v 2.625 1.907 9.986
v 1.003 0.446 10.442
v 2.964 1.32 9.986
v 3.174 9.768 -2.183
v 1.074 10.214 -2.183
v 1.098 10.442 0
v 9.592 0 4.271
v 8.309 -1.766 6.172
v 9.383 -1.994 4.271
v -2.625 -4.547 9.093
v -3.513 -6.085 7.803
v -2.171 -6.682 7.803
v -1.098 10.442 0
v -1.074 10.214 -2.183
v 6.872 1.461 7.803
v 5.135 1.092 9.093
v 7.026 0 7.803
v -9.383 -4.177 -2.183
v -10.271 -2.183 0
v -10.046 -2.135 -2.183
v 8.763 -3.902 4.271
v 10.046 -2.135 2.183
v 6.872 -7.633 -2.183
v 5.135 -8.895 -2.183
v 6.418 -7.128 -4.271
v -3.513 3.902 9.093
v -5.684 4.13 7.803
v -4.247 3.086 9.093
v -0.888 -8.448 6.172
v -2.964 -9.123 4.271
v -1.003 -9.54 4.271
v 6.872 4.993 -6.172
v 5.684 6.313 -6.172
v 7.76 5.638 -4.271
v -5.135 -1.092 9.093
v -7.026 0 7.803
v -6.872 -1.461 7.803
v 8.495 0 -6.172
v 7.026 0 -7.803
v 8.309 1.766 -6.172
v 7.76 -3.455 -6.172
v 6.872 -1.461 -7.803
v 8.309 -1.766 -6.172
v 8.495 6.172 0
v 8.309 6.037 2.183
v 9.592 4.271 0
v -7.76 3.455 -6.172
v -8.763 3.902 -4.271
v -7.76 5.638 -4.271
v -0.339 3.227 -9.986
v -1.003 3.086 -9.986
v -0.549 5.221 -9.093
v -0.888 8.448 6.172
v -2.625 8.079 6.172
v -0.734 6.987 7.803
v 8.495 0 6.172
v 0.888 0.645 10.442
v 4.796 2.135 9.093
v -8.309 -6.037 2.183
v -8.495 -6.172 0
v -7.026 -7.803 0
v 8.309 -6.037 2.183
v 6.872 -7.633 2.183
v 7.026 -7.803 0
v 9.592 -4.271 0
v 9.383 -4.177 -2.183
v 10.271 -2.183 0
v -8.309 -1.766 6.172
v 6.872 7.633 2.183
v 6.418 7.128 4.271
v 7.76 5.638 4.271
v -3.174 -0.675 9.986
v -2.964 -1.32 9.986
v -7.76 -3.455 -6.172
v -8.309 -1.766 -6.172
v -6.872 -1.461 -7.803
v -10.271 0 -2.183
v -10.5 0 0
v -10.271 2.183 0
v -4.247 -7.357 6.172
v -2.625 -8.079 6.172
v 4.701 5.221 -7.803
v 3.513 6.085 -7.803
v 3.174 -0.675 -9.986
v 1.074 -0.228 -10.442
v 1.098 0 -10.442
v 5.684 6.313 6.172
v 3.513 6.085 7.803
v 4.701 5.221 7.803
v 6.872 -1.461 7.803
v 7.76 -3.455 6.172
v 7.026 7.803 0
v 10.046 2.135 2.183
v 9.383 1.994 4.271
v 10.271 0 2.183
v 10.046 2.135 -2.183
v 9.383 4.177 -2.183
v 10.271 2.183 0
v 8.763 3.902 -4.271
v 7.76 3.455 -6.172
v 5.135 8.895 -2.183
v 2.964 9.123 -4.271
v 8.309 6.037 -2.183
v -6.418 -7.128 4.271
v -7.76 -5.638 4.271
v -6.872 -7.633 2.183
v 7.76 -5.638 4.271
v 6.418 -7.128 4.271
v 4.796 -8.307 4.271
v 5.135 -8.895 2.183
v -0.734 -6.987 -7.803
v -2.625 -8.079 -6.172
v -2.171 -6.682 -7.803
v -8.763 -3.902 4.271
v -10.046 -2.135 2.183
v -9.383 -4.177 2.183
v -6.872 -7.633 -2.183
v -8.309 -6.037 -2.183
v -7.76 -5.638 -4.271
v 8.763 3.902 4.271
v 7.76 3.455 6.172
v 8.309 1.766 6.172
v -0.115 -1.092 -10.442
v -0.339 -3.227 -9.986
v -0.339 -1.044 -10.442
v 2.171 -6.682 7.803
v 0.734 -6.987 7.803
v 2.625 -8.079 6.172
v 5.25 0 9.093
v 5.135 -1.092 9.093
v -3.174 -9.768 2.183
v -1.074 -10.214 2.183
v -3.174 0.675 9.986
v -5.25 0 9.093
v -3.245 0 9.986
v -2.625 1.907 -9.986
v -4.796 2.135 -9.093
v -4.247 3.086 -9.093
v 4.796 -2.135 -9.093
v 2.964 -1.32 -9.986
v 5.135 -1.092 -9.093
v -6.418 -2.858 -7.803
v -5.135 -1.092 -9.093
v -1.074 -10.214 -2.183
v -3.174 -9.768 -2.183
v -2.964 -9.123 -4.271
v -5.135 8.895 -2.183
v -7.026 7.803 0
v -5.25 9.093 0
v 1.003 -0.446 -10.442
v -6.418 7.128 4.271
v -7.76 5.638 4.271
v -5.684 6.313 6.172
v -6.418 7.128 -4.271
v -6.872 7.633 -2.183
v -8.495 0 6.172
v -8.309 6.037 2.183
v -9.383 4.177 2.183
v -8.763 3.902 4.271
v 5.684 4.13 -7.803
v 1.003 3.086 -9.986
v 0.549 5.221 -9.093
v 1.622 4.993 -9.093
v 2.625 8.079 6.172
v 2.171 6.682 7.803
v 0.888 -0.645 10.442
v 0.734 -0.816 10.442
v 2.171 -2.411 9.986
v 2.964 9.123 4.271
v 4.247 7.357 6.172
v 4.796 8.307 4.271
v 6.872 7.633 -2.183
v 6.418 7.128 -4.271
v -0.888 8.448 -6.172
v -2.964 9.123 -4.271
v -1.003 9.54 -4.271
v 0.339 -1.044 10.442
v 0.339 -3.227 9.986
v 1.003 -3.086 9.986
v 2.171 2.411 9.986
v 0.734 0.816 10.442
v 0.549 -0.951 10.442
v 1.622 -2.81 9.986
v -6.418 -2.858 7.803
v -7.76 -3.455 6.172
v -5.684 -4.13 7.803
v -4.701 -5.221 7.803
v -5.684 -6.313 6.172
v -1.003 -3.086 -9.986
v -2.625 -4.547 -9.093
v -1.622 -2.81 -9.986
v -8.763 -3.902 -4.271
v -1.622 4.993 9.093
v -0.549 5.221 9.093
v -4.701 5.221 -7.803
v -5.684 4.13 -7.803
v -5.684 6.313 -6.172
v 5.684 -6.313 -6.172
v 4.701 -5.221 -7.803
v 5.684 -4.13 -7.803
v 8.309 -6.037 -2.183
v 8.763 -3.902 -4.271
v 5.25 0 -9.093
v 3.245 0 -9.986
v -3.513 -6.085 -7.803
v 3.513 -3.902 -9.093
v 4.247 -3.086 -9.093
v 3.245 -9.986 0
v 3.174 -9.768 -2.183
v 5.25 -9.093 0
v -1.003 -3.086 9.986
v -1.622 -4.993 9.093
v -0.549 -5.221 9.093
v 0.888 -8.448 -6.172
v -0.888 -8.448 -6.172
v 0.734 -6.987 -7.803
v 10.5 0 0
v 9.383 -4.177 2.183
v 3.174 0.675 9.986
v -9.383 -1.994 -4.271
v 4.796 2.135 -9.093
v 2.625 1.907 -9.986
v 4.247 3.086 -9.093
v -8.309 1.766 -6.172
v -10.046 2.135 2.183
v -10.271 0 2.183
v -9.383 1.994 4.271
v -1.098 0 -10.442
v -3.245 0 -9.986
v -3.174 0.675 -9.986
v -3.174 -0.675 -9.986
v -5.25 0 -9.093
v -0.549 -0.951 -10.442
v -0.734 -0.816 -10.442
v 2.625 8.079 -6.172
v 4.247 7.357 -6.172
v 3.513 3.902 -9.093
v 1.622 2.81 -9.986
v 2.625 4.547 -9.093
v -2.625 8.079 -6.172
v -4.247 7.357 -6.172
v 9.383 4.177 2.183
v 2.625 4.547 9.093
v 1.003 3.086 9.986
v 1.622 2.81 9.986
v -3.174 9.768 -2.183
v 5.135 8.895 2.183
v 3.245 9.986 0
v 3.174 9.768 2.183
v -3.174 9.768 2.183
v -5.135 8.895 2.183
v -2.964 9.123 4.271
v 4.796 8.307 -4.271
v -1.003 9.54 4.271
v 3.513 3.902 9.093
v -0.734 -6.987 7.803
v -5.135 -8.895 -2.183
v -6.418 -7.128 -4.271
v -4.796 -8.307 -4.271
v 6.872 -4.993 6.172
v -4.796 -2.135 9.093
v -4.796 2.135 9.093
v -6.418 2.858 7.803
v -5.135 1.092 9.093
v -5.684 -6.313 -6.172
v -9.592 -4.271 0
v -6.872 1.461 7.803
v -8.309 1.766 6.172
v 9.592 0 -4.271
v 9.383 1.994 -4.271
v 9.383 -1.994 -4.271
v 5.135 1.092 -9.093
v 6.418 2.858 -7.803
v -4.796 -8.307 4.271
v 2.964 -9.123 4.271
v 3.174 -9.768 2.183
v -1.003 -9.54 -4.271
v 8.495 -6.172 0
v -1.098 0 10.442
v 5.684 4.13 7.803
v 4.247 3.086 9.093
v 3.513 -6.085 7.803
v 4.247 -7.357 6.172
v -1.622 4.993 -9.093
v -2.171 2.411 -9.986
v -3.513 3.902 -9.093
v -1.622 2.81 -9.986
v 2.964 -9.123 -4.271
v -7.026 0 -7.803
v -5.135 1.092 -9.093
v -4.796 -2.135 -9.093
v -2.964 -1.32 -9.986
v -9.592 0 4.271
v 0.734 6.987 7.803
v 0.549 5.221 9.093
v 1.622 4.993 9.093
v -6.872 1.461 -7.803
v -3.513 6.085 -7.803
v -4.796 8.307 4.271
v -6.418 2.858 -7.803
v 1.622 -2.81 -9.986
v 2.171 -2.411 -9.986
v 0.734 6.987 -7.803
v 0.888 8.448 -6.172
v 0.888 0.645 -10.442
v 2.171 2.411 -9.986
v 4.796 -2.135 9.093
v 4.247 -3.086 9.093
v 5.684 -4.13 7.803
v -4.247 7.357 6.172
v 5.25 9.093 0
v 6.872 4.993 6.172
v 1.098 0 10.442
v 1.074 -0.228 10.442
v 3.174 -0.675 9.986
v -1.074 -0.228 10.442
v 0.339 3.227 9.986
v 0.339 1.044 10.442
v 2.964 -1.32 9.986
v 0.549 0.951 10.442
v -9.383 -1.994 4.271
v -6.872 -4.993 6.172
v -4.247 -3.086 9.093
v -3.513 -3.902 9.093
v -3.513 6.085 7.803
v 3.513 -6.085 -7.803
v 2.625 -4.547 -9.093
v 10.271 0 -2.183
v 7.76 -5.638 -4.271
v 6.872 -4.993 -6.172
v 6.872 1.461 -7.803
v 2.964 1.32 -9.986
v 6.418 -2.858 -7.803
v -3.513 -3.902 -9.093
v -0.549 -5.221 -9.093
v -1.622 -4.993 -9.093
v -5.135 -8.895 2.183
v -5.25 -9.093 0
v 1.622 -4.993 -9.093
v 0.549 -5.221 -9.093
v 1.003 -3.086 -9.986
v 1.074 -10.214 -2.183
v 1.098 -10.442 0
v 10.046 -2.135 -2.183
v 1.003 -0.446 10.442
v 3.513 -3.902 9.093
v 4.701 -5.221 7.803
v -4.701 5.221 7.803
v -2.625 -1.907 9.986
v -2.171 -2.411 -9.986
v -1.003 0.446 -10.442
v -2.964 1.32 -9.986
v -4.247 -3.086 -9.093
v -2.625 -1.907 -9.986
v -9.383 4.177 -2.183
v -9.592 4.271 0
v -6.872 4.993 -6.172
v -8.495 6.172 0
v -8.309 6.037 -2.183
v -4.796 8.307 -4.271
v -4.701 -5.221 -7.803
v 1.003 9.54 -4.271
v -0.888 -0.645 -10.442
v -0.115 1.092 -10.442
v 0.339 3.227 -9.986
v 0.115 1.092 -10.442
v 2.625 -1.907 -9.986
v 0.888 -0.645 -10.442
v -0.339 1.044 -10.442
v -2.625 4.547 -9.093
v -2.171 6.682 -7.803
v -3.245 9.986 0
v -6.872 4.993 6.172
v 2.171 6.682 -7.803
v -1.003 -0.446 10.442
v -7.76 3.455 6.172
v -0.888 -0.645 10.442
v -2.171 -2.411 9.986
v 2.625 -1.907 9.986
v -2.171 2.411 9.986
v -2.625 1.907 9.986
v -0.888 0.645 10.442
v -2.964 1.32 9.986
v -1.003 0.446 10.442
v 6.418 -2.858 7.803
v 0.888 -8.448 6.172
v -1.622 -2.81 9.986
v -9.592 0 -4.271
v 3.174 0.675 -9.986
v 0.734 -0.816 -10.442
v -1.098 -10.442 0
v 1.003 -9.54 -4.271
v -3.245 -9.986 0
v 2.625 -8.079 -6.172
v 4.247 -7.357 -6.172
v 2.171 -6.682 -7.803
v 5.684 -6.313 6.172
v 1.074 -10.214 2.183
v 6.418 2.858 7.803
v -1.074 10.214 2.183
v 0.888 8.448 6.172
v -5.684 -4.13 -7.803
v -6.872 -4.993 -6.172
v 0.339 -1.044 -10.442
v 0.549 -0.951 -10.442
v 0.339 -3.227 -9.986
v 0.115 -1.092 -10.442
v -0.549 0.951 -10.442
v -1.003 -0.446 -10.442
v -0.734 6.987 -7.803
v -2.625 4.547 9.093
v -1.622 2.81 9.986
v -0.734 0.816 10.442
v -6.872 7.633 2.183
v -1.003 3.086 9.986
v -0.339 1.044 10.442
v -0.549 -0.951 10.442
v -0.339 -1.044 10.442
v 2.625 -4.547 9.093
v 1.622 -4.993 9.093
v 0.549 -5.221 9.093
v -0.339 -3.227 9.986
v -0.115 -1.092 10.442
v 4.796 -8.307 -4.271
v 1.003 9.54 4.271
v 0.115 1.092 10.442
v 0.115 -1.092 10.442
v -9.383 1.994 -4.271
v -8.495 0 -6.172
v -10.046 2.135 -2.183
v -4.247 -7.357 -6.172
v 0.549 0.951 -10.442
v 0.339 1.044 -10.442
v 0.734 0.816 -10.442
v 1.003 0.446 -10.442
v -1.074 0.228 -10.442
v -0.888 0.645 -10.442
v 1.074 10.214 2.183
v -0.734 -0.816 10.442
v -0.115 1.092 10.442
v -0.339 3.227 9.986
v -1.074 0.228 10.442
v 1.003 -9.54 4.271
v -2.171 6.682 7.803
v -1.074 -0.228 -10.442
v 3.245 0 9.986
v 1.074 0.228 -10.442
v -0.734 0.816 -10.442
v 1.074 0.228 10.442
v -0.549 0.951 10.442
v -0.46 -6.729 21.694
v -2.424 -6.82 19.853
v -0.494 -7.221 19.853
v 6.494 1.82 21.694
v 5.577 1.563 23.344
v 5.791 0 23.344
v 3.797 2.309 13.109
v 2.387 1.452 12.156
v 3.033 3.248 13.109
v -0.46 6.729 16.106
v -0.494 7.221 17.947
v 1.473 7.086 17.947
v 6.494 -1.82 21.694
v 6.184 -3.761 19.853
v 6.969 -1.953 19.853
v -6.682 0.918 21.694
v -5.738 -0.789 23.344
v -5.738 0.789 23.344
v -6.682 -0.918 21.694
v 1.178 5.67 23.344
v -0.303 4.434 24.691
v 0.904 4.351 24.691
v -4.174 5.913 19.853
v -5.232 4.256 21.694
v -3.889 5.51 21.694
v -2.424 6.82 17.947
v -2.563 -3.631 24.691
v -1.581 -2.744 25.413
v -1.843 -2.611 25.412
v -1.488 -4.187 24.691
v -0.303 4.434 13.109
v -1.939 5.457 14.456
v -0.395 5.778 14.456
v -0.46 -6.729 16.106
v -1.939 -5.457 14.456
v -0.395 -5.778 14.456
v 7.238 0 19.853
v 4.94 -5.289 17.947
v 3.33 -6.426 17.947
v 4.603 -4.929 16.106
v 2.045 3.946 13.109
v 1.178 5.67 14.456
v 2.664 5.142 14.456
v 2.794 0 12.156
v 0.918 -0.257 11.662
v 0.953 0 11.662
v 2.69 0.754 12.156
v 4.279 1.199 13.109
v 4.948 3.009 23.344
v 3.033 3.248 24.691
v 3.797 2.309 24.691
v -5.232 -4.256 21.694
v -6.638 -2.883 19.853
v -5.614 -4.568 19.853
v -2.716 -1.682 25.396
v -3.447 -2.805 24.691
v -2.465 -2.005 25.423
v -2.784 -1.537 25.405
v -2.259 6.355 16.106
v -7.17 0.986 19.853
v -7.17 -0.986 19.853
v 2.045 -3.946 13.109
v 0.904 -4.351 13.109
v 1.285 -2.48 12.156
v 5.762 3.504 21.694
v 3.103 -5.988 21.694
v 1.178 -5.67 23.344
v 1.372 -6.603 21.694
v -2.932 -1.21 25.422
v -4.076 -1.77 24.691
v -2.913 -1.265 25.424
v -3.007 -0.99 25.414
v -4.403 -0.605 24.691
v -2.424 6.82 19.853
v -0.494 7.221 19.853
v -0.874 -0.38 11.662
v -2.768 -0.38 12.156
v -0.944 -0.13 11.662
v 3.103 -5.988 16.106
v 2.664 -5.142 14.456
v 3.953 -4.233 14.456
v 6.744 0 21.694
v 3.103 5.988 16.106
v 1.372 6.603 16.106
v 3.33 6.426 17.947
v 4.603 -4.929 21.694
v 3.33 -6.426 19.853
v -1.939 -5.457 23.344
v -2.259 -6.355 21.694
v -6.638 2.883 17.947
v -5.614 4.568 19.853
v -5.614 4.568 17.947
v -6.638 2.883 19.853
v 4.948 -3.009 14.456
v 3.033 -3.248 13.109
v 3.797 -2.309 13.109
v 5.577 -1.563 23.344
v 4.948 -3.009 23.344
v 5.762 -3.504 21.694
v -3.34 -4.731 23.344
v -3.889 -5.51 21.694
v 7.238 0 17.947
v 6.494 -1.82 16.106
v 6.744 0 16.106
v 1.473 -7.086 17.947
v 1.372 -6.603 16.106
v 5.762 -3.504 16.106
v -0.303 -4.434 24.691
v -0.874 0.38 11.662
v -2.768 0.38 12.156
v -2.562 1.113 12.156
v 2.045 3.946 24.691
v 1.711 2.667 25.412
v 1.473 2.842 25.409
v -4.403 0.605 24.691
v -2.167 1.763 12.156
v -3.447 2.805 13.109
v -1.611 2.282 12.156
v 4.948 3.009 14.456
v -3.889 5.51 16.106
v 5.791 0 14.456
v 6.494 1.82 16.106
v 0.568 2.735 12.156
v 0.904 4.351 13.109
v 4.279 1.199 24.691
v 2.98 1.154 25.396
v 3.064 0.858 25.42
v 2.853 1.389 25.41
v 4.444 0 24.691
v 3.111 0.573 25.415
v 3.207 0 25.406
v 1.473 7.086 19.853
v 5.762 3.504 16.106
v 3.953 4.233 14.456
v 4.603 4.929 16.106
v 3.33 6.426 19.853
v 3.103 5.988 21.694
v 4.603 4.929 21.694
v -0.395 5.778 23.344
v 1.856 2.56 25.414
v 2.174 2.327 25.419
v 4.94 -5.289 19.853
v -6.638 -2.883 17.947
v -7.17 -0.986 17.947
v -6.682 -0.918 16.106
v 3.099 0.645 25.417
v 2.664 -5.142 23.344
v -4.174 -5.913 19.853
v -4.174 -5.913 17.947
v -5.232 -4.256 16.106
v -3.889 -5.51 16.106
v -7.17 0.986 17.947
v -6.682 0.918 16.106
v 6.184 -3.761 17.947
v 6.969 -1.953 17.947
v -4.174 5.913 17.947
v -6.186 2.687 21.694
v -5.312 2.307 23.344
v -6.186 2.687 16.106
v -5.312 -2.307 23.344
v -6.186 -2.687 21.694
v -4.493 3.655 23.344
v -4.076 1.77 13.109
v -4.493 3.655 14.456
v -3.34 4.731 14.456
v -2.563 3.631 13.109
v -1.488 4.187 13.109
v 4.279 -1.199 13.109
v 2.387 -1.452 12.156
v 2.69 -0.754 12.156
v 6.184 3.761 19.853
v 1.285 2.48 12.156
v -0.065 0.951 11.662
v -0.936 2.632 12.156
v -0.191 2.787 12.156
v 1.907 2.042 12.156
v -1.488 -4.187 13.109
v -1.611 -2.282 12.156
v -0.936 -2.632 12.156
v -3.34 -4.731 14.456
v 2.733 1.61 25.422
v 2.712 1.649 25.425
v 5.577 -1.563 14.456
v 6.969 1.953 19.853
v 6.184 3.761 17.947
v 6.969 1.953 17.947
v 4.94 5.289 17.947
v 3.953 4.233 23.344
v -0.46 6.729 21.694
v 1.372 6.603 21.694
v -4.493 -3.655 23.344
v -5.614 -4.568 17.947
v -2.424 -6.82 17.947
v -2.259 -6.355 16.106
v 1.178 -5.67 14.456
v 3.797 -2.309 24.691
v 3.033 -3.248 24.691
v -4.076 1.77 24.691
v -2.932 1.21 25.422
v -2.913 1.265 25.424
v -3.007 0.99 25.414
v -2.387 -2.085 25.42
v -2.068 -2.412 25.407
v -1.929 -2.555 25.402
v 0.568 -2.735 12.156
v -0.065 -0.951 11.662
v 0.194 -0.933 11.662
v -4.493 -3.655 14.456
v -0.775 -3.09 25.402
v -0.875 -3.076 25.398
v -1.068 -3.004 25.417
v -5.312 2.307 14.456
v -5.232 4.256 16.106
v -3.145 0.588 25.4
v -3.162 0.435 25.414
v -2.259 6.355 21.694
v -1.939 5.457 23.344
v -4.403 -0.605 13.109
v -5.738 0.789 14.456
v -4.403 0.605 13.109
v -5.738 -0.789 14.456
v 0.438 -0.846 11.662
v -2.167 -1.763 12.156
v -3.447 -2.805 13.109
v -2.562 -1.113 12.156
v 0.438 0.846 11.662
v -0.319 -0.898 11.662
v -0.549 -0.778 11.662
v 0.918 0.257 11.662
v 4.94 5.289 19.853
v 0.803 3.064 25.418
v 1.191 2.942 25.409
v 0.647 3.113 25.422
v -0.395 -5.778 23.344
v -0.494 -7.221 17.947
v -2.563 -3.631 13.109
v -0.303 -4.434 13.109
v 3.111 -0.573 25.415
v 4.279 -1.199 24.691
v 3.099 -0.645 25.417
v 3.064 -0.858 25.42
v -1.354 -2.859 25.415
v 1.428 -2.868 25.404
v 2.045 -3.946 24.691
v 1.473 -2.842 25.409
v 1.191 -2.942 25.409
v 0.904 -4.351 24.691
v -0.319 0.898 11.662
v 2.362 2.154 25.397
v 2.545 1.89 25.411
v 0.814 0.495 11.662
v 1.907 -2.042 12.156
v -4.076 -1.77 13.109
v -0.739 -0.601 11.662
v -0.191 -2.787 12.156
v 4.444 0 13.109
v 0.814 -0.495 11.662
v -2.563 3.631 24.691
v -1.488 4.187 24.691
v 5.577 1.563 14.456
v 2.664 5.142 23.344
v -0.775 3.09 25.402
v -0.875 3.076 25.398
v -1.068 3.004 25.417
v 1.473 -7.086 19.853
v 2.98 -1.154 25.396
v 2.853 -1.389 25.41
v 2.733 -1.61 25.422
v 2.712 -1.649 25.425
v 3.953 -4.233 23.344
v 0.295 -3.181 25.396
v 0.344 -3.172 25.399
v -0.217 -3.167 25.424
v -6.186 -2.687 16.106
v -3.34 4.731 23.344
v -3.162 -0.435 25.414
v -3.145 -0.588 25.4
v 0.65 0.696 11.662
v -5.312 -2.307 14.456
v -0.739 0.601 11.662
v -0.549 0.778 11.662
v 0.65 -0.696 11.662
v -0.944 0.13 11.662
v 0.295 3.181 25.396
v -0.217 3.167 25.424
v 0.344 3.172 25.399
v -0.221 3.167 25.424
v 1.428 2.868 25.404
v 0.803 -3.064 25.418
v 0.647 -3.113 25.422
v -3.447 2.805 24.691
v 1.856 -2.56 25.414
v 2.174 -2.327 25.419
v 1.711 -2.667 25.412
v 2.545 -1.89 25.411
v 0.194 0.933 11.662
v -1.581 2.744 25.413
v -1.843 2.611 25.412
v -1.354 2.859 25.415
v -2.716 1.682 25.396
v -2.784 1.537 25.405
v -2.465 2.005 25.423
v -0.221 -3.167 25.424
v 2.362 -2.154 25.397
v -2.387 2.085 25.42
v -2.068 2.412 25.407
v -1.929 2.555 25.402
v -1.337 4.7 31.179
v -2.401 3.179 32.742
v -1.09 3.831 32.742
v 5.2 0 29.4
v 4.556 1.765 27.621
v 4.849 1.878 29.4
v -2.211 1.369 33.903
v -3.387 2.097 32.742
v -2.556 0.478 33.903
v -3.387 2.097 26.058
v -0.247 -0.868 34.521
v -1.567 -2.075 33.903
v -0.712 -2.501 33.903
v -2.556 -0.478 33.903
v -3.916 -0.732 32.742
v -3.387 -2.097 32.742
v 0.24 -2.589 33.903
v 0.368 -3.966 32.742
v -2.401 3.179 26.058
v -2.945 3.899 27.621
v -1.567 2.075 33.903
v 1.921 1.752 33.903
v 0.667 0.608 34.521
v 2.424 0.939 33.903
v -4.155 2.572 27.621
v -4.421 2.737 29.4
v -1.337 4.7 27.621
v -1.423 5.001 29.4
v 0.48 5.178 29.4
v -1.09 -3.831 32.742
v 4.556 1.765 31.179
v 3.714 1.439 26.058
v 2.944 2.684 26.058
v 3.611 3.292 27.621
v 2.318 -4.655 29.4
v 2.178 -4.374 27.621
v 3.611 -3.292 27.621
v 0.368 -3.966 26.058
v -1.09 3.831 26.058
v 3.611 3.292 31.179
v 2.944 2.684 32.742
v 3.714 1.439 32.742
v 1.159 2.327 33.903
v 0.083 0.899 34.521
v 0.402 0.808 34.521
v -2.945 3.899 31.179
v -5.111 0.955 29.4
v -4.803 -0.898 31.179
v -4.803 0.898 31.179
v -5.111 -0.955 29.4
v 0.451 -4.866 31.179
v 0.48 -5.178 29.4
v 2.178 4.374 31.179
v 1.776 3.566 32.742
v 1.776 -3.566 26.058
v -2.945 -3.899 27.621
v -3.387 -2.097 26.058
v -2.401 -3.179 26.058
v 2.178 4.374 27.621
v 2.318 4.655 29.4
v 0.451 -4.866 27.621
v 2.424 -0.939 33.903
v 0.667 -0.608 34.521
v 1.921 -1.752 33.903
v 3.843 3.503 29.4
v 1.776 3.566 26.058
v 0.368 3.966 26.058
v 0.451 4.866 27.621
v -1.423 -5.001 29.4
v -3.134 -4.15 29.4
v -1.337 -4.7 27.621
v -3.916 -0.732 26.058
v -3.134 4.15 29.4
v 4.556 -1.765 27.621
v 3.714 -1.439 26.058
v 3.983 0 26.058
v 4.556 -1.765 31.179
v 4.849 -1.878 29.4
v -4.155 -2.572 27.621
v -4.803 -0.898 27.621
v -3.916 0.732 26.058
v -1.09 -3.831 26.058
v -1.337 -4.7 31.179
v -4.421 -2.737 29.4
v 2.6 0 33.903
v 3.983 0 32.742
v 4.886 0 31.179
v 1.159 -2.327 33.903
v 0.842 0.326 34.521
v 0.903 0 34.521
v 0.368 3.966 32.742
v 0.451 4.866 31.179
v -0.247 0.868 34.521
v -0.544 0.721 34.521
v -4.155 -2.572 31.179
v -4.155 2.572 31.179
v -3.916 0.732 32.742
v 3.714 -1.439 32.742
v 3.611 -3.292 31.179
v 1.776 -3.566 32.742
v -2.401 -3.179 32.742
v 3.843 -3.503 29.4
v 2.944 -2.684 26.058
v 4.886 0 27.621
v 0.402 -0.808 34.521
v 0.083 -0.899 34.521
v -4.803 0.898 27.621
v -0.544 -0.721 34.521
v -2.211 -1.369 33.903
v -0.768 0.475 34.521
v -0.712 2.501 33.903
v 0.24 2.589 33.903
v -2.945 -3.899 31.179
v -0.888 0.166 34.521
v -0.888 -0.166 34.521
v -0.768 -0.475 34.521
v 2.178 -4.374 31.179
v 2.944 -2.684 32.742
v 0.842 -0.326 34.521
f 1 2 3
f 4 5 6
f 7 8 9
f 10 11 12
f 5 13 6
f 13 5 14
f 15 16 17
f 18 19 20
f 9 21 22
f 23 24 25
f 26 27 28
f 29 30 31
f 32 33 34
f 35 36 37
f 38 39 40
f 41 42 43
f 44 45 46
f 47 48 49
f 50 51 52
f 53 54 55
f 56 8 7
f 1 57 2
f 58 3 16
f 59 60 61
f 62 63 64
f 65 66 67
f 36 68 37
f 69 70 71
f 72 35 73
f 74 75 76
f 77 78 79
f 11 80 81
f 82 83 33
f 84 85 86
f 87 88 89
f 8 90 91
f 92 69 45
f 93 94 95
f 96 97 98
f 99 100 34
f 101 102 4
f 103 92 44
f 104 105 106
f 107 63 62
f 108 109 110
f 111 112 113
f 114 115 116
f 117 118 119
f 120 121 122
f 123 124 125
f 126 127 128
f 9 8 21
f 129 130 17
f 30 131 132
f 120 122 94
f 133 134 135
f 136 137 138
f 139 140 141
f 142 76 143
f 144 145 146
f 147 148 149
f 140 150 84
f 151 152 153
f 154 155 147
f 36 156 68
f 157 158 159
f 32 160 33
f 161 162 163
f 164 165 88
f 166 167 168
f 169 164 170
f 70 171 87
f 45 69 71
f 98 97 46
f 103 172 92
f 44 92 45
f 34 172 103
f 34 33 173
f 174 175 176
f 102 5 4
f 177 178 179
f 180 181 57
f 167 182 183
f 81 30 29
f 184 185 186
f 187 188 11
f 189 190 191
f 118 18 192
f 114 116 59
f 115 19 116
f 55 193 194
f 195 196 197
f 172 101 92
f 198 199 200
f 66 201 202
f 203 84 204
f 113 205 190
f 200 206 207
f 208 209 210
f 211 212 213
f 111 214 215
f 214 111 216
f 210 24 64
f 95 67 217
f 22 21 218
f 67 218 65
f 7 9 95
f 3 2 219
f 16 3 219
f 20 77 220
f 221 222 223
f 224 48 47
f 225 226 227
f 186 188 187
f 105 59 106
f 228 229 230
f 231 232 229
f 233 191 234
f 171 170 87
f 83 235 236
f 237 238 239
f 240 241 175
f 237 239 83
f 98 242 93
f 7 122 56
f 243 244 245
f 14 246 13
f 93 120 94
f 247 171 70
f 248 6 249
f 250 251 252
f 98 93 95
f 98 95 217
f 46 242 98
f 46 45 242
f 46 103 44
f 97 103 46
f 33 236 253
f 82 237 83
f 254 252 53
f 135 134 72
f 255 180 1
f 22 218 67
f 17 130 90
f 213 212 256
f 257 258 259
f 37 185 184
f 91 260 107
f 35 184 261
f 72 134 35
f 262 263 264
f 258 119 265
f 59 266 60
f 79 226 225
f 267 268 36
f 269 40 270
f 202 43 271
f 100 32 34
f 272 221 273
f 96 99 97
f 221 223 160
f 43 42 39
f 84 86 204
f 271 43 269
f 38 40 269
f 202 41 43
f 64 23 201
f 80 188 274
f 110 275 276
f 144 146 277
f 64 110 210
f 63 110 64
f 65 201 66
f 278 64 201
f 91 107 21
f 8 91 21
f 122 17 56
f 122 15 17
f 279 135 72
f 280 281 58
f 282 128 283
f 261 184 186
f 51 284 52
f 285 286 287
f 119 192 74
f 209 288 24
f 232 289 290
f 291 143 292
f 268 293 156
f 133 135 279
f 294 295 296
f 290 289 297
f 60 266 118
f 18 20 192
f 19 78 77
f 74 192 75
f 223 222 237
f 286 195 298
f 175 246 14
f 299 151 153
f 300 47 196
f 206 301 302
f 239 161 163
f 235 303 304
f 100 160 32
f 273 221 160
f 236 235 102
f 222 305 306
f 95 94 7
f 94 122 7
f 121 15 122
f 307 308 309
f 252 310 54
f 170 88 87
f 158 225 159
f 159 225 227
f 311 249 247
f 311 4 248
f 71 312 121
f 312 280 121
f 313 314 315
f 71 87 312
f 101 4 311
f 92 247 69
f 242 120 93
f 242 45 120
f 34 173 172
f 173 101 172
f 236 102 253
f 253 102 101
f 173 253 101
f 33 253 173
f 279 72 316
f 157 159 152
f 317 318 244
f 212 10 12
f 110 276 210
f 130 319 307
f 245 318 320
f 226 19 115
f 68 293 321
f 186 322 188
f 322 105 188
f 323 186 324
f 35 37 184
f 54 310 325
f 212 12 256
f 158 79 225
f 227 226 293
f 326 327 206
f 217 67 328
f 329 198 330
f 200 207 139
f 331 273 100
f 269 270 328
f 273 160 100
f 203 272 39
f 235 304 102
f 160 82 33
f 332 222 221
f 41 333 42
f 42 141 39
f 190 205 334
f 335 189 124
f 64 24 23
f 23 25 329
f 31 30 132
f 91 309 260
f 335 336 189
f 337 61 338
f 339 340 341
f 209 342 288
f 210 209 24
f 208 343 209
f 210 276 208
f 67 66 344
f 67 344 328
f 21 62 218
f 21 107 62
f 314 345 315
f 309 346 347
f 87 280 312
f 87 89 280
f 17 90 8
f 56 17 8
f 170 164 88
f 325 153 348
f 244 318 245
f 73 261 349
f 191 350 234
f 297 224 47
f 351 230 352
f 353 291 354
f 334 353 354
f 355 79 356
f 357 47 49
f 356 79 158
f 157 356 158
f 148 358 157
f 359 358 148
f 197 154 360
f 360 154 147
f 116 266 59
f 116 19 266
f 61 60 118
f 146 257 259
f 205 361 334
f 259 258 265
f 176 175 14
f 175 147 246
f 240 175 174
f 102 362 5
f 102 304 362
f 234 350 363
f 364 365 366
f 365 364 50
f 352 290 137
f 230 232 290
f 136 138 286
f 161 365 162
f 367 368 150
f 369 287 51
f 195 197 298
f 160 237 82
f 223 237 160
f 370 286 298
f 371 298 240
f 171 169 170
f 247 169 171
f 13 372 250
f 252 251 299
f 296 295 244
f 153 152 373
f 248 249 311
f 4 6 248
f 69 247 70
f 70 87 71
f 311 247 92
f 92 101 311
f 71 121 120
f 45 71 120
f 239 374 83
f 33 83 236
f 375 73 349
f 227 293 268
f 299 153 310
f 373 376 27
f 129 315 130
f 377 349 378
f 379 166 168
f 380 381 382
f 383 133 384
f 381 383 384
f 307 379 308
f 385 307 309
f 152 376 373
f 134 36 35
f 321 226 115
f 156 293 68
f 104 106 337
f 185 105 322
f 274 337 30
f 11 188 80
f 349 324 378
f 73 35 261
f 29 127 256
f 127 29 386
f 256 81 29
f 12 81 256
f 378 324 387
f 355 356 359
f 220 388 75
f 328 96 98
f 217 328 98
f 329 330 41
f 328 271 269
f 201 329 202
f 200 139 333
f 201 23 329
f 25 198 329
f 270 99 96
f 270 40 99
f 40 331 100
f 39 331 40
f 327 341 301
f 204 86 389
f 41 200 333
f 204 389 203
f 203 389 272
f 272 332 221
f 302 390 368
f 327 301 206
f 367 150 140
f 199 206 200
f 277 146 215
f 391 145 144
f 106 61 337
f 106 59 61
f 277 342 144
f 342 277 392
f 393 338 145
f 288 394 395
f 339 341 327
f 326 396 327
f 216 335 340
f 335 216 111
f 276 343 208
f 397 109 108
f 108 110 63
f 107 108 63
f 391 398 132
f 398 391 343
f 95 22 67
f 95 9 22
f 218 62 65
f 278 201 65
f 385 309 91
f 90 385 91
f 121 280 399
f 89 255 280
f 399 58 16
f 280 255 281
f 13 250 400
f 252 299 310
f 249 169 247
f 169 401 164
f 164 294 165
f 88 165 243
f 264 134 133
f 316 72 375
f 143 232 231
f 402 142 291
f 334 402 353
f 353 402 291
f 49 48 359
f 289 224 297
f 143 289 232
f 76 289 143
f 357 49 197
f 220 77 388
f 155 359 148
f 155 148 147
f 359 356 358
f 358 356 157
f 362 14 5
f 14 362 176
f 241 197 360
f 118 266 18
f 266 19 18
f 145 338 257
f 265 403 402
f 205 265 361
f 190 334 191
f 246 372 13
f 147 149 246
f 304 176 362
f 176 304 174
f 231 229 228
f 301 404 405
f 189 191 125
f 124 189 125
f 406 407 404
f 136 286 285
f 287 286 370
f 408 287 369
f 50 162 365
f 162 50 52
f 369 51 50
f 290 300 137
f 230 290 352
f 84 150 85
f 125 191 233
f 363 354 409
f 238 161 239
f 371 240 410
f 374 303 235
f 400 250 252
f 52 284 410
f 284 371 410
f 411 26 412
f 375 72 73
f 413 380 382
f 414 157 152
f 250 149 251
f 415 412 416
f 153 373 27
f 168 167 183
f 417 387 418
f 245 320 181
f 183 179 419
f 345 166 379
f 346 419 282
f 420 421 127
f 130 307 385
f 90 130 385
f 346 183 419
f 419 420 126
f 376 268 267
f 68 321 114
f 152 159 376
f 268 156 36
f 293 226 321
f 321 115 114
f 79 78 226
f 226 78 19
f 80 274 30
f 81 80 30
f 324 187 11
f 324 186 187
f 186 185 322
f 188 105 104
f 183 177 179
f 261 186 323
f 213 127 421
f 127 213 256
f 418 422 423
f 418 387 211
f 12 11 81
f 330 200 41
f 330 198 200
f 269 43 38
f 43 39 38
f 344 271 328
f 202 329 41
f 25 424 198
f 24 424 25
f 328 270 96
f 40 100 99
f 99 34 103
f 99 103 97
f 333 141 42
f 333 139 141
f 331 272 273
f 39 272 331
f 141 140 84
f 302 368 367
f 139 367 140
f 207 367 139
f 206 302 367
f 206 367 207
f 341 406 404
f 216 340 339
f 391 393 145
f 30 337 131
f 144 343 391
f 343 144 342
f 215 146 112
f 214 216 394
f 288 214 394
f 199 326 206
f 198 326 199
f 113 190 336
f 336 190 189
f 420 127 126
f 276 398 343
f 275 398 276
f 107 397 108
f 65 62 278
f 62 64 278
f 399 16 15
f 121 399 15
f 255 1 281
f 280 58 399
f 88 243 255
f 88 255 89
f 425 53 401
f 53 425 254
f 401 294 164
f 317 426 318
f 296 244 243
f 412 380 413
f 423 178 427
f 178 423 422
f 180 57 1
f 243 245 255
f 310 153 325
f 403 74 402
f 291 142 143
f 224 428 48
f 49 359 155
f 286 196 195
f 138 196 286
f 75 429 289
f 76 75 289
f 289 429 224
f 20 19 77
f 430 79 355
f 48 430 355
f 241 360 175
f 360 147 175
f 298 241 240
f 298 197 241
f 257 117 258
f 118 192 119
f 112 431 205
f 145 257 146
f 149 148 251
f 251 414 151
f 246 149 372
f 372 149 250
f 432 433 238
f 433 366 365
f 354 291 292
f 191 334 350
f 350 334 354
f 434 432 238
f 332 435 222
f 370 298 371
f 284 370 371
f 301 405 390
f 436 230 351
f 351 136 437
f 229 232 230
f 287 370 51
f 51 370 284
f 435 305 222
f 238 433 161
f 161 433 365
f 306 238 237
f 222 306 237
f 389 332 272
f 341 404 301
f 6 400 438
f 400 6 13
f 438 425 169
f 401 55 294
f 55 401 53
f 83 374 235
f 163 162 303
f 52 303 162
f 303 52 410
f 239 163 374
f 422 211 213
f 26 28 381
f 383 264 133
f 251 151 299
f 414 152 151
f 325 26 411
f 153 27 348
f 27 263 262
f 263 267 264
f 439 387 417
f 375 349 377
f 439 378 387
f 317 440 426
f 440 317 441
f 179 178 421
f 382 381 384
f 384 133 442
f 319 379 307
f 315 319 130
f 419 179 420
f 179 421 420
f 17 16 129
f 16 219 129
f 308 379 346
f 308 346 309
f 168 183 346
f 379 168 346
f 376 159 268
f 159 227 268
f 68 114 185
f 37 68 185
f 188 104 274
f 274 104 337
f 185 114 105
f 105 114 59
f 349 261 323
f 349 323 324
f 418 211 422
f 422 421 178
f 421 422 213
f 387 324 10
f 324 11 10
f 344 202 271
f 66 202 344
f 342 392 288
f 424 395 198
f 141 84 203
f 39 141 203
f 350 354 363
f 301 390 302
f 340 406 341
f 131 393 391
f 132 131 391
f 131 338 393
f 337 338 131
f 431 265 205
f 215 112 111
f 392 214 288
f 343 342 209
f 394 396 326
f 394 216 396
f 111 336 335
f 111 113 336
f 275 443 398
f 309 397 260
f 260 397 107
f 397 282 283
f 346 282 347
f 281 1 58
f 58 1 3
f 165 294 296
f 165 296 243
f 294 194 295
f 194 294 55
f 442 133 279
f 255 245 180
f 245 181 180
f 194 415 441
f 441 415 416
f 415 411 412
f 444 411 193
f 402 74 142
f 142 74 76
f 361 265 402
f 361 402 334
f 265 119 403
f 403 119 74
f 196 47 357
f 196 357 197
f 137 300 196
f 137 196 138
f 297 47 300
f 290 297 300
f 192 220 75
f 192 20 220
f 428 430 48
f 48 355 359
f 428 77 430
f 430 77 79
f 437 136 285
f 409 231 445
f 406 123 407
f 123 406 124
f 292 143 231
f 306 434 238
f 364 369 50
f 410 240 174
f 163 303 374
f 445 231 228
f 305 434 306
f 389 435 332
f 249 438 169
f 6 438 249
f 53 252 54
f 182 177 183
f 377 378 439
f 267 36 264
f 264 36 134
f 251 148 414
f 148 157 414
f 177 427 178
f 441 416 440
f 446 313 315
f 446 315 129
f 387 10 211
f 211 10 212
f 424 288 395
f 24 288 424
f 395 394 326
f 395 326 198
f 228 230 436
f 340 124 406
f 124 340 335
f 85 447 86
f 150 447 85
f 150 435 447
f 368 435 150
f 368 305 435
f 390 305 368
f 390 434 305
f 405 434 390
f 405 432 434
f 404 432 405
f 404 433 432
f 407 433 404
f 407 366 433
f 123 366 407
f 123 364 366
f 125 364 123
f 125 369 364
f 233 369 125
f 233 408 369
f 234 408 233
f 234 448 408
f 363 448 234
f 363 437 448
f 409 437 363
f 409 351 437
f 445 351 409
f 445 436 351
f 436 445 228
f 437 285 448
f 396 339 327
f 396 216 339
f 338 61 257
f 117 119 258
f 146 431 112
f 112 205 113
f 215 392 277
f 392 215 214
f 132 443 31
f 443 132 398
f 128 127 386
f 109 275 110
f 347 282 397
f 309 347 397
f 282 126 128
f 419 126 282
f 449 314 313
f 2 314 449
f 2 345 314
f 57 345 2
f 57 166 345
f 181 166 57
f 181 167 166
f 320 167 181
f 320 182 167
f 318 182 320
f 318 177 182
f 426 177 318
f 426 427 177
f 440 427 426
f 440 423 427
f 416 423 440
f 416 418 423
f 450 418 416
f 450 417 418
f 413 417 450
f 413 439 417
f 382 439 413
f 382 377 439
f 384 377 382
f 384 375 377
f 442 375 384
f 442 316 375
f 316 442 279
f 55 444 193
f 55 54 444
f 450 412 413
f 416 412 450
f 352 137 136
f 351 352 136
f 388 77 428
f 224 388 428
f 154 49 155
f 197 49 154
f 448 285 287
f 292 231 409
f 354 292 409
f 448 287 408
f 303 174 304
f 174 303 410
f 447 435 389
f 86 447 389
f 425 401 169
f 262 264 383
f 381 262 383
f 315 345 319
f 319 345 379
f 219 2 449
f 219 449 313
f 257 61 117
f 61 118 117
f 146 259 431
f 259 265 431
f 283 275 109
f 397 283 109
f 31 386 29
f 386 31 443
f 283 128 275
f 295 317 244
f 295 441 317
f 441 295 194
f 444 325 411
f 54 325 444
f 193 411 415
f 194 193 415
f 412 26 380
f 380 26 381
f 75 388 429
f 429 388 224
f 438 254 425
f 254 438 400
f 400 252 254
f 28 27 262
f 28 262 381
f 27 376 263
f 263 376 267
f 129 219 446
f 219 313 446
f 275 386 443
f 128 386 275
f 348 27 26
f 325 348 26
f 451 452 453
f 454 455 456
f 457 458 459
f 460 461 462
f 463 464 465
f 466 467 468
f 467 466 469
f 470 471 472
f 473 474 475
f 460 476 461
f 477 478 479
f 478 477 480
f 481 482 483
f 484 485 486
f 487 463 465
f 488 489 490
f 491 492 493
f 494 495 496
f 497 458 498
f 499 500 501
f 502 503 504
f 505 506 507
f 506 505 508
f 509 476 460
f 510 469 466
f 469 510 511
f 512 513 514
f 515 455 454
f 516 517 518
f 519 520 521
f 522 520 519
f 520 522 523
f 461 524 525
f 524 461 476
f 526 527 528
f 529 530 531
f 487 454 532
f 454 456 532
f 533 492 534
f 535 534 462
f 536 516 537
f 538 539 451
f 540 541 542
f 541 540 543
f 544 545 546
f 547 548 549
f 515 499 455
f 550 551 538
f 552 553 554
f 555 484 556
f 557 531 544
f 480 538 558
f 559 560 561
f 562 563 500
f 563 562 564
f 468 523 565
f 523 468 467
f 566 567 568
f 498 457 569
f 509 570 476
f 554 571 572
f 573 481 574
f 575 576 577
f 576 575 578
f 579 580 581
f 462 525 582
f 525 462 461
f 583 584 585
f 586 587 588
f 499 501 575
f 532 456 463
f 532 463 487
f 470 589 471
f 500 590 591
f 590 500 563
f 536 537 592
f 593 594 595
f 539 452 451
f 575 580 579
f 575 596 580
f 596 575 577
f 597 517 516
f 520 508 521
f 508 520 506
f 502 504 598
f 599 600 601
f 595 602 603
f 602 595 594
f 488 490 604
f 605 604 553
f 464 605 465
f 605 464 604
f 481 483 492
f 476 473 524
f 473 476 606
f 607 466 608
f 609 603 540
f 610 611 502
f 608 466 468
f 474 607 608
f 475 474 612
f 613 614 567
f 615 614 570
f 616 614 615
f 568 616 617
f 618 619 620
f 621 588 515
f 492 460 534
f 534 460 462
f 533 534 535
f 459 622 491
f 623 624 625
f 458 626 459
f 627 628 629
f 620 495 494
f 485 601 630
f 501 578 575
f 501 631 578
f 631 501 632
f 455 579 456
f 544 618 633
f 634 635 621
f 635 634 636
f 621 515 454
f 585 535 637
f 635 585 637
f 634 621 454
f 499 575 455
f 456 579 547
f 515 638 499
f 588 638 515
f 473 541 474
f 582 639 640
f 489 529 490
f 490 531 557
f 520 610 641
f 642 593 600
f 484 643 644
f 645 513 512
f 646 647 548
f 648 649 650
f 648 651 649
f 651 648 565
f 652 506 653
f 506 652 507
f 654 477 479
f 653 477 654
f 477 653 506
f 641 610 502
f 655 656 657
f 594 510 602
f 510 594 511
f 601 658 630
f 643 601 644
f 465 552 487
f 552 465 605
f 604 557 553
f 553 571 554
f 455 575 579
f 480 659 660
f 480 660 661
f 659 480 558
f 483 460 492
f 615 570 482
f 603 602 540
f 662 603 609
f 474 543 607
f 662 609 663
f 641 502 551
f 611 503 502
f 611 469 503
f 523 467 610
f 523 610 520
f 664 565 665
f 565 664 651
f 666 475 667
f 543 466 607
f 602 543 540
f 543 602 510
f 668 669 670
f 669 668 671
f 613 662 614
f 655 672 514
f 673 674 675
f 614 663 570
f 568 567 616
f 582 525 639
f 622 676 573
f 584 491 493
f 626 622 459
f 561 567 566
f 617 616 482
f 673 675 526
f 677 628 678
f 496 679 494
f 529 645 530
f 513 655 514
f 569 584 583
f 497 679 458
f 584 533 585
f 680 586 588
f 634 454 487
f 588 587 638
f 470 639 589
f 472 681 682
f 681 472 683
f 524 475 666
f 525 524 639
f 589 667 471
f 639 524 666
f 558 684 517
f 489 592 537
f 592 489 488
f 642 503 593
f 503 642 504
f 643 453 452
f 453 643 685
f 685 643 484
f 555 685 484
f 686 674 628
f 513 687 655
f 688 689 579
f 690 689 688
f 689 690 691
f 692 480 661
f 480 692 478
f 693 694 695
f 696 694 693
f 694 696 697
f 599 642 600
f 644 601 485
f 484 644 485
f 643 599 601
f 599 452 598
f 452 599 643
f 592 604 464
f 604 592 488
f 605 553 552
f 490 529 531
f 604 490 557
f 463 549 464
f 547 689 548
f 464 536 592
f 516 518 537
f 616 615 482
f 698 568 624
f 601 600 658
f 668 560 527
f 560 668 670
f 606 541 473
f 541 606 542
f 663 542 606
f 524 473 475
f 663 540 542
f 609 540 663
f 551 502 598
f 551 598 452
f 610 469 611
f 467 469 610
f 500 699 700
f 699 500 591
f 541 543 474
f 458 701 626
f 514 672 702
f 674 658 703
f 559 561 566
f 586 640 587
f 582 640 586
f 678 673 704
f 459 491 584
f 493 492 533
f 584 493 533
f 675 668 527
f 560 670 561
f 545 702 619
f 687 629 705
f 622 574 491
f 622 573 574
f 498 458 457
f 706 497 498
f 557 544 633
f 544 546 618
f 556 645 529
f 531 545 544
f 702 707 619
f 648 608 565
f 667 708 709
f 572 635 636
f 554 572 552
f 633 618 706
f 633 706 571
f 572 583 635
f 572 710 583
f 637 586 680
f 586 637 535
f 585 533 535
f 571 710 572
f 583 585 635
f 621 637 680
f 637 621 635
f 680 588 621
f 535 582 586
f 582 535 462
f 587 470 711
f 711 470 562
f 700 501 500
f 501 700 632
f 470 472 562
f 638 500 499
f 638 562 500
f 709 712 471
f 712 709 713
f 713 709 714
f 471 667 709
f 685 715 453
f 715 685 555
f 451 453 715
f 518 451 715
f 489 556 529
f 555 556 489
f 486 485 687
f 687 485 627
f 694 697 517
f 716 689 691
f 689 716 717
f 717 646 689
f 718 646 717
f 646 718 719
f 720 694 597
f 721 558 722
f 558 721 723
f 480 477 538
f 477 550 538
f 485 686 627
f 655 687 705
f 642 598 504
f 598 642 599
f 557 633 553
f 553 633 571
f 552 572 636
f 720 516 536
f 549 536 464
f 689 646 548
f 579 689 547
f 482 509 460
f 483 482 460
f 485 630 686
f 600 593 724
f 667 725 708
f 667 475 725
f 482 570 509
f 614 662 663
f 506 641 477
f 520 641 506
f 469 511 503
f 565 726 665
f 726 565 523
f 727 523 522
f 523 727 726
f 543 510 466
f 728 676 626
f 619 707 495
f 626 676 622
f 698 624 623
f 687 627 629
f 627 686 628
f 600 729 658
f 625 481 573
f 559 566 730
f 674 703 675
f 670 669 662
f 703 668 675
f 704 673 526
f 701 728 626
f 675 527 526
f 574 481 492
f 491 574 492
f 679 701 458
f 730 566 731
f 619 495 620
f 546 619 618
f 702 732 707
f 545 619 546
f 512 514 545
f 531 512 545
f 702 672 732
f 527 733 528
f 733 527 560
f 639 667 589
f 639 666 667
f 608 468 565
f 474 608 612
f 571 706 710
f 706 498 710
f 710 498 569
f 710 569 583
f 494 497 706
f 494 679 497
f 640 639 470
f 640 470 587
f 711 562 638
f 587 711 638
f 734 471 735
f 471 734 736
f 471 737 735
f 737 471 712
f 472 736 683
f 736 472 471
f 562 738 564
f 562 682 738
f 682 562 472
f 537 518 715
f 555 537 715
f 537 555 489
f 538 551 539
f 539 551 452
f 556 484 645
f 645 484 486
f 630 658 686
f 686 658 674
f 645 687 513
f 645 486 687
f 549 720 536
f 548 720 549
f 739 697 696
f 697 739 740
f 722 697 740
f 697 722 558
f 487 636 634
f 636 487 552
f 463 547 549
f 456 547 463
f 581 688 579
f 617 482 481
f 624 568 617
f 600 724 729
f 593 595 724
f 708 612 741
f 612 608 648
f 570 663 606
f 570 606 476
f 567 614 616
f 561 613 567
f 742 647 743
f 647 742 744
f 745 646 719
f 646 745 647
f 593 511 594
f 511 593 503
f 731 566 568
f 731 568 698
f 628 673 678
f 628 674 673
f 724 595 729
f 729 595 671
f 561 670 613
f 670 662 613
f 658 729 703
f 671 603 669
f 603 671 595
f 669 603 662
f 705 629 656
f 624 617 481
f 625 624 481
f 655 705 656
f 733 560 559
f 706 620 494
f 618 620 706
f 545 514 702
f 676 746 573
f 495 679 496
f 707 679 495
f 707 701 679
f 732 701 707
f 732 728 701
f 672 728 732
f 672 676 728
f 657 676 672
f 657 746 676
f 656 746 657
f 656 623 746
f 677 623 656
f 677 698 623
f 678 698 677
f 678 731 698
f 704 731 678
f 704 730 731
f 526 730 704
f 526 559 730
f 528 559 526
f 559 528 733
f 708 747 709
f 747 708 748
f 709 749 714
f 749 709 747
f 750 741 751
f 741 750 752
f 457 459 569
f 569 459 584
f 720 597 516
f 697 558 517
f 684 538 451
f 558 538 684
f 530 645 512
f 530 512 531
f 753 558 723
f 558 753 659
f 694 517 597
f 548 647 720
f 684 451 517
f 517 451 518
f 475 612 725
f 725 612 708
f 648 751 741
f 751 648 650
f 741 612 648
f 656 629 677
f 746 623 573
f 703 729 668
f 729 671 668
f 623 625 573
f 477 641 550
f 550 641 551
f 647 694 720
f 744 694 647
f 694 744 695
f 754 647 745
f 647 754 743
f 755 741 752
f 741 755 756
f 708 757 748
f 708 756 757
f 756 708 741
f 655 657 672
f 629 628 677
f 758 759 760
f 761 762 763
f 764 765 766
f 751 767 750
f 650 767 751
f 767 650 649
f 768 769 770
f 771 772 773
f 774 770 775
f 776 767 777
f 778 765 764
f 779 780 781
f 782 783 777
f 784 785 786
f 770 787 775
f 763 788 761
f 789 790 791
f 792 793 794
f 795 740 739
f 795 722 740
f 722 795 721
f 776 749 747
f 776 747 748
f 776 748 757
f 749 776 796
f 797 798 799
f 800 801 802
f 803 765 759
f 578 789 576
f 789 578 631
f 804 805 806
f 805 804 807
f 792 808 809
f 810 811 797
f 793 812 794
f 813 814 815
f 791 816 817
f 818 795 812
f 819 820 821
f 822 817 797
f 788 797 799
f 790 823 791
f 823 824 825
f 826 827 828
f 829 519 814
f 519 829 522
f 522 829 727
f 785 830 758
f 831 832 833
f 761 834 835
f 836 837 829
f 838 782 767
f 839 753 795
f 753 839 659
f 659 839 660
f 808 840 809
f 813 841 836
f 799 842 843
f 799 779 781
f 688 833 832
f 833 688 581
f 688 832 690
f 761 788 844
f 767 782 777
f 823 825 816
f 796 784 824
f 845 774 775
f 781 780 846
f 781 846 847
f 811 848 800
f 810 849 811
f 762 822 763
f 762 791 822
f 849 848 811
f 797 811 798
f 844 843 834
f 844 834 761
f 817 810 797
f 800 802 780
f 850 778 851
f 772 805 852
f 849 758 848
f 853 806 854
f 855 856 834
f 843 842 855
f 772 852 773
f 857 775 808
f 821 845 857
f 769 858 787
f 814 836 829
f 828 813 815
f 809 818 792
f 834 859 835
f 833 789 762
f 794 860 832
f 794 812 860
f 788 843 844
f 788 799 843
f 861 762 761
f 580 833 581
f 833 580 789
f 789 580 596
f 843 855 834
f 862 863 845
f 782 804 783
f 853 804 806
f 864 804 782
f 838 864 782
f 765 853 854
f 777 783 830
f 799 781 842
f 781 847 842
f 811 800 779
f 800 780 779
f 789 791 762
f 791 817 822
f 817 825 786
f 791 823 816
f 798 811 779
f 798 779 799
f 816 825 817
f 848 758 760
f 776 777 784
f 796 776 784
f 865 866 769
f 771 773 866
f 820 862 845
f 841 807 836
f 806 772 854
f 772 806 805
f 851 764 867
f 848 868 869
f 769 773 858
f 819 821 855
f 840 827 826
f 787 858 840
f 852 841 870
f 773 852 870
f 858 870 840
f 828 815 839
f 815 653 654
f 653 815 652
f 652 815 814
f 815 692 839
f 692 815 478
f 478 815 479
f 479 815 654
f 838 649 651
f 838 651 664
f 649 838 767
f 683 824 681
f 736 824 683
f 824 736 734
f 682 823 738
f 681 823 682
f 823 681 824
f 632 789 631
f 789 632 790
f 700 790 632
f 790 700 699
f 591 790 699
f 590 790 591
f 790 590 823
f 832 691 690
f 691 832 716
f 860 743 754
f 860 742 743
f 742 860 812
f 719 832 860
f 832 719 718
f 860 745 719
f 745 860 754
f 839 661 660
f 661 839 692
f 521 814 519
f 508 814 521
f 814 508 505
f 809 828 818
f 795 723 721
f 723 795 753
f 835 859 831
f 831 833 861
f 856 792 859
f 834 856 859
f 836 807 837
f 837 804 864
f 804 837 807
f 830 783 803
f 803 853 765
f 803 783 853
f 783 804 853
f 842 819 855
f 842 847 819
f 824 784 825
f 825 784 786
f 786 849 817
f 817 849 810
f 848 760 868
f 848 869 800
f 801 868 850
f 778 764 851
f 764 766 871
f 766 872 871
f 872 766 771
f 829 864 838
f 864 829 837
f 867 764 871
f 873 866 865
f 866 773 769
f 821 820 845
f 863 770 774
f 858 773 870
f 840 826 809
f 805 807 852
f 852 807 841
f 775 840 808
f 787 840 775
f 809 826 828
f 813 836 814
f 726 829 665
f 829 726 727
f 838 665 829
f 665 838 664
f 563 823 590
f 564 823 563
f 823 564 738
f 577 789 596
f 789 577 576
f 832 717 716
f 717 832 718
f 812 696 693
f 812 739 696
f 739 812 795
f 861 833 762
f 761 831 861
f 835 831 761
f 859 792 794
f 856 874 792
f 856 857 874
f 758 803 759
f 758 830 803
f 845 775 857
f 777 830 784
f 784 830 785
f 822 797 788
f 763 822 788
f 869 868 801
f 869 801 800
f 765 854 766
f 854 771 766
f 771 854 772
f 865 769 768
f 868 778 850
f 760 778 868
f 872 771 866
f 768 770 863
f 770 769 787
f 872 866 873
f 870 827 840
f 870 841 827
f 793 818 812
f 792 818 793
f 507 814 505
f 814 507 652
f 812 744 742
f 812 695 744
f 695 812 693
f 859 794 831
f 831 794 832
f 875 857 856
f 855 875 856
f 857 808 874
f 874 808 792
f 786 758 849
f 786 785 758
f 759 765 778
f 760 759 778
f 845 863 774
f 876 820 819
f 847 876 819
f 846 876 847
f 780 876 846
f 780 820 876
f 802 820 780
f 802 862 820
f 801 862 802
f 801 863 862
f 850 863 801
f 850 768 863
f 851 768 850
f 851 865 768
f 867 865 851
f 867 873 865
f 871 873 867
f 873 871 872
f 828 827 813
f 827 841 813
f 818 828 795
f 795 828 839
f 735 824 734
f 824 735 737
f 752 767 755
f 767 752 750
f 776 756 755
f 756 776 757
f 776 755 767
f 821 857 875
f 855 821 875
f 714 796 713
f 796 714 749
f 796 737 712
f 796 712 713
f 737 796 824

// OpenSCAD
union() {
  sphere(r=10.5);
  translate([0.0,0.0,18.9]) sphere(r=7.3);
  translate([0.0,0.0,29.4]) sphere(r=5.2);
}
